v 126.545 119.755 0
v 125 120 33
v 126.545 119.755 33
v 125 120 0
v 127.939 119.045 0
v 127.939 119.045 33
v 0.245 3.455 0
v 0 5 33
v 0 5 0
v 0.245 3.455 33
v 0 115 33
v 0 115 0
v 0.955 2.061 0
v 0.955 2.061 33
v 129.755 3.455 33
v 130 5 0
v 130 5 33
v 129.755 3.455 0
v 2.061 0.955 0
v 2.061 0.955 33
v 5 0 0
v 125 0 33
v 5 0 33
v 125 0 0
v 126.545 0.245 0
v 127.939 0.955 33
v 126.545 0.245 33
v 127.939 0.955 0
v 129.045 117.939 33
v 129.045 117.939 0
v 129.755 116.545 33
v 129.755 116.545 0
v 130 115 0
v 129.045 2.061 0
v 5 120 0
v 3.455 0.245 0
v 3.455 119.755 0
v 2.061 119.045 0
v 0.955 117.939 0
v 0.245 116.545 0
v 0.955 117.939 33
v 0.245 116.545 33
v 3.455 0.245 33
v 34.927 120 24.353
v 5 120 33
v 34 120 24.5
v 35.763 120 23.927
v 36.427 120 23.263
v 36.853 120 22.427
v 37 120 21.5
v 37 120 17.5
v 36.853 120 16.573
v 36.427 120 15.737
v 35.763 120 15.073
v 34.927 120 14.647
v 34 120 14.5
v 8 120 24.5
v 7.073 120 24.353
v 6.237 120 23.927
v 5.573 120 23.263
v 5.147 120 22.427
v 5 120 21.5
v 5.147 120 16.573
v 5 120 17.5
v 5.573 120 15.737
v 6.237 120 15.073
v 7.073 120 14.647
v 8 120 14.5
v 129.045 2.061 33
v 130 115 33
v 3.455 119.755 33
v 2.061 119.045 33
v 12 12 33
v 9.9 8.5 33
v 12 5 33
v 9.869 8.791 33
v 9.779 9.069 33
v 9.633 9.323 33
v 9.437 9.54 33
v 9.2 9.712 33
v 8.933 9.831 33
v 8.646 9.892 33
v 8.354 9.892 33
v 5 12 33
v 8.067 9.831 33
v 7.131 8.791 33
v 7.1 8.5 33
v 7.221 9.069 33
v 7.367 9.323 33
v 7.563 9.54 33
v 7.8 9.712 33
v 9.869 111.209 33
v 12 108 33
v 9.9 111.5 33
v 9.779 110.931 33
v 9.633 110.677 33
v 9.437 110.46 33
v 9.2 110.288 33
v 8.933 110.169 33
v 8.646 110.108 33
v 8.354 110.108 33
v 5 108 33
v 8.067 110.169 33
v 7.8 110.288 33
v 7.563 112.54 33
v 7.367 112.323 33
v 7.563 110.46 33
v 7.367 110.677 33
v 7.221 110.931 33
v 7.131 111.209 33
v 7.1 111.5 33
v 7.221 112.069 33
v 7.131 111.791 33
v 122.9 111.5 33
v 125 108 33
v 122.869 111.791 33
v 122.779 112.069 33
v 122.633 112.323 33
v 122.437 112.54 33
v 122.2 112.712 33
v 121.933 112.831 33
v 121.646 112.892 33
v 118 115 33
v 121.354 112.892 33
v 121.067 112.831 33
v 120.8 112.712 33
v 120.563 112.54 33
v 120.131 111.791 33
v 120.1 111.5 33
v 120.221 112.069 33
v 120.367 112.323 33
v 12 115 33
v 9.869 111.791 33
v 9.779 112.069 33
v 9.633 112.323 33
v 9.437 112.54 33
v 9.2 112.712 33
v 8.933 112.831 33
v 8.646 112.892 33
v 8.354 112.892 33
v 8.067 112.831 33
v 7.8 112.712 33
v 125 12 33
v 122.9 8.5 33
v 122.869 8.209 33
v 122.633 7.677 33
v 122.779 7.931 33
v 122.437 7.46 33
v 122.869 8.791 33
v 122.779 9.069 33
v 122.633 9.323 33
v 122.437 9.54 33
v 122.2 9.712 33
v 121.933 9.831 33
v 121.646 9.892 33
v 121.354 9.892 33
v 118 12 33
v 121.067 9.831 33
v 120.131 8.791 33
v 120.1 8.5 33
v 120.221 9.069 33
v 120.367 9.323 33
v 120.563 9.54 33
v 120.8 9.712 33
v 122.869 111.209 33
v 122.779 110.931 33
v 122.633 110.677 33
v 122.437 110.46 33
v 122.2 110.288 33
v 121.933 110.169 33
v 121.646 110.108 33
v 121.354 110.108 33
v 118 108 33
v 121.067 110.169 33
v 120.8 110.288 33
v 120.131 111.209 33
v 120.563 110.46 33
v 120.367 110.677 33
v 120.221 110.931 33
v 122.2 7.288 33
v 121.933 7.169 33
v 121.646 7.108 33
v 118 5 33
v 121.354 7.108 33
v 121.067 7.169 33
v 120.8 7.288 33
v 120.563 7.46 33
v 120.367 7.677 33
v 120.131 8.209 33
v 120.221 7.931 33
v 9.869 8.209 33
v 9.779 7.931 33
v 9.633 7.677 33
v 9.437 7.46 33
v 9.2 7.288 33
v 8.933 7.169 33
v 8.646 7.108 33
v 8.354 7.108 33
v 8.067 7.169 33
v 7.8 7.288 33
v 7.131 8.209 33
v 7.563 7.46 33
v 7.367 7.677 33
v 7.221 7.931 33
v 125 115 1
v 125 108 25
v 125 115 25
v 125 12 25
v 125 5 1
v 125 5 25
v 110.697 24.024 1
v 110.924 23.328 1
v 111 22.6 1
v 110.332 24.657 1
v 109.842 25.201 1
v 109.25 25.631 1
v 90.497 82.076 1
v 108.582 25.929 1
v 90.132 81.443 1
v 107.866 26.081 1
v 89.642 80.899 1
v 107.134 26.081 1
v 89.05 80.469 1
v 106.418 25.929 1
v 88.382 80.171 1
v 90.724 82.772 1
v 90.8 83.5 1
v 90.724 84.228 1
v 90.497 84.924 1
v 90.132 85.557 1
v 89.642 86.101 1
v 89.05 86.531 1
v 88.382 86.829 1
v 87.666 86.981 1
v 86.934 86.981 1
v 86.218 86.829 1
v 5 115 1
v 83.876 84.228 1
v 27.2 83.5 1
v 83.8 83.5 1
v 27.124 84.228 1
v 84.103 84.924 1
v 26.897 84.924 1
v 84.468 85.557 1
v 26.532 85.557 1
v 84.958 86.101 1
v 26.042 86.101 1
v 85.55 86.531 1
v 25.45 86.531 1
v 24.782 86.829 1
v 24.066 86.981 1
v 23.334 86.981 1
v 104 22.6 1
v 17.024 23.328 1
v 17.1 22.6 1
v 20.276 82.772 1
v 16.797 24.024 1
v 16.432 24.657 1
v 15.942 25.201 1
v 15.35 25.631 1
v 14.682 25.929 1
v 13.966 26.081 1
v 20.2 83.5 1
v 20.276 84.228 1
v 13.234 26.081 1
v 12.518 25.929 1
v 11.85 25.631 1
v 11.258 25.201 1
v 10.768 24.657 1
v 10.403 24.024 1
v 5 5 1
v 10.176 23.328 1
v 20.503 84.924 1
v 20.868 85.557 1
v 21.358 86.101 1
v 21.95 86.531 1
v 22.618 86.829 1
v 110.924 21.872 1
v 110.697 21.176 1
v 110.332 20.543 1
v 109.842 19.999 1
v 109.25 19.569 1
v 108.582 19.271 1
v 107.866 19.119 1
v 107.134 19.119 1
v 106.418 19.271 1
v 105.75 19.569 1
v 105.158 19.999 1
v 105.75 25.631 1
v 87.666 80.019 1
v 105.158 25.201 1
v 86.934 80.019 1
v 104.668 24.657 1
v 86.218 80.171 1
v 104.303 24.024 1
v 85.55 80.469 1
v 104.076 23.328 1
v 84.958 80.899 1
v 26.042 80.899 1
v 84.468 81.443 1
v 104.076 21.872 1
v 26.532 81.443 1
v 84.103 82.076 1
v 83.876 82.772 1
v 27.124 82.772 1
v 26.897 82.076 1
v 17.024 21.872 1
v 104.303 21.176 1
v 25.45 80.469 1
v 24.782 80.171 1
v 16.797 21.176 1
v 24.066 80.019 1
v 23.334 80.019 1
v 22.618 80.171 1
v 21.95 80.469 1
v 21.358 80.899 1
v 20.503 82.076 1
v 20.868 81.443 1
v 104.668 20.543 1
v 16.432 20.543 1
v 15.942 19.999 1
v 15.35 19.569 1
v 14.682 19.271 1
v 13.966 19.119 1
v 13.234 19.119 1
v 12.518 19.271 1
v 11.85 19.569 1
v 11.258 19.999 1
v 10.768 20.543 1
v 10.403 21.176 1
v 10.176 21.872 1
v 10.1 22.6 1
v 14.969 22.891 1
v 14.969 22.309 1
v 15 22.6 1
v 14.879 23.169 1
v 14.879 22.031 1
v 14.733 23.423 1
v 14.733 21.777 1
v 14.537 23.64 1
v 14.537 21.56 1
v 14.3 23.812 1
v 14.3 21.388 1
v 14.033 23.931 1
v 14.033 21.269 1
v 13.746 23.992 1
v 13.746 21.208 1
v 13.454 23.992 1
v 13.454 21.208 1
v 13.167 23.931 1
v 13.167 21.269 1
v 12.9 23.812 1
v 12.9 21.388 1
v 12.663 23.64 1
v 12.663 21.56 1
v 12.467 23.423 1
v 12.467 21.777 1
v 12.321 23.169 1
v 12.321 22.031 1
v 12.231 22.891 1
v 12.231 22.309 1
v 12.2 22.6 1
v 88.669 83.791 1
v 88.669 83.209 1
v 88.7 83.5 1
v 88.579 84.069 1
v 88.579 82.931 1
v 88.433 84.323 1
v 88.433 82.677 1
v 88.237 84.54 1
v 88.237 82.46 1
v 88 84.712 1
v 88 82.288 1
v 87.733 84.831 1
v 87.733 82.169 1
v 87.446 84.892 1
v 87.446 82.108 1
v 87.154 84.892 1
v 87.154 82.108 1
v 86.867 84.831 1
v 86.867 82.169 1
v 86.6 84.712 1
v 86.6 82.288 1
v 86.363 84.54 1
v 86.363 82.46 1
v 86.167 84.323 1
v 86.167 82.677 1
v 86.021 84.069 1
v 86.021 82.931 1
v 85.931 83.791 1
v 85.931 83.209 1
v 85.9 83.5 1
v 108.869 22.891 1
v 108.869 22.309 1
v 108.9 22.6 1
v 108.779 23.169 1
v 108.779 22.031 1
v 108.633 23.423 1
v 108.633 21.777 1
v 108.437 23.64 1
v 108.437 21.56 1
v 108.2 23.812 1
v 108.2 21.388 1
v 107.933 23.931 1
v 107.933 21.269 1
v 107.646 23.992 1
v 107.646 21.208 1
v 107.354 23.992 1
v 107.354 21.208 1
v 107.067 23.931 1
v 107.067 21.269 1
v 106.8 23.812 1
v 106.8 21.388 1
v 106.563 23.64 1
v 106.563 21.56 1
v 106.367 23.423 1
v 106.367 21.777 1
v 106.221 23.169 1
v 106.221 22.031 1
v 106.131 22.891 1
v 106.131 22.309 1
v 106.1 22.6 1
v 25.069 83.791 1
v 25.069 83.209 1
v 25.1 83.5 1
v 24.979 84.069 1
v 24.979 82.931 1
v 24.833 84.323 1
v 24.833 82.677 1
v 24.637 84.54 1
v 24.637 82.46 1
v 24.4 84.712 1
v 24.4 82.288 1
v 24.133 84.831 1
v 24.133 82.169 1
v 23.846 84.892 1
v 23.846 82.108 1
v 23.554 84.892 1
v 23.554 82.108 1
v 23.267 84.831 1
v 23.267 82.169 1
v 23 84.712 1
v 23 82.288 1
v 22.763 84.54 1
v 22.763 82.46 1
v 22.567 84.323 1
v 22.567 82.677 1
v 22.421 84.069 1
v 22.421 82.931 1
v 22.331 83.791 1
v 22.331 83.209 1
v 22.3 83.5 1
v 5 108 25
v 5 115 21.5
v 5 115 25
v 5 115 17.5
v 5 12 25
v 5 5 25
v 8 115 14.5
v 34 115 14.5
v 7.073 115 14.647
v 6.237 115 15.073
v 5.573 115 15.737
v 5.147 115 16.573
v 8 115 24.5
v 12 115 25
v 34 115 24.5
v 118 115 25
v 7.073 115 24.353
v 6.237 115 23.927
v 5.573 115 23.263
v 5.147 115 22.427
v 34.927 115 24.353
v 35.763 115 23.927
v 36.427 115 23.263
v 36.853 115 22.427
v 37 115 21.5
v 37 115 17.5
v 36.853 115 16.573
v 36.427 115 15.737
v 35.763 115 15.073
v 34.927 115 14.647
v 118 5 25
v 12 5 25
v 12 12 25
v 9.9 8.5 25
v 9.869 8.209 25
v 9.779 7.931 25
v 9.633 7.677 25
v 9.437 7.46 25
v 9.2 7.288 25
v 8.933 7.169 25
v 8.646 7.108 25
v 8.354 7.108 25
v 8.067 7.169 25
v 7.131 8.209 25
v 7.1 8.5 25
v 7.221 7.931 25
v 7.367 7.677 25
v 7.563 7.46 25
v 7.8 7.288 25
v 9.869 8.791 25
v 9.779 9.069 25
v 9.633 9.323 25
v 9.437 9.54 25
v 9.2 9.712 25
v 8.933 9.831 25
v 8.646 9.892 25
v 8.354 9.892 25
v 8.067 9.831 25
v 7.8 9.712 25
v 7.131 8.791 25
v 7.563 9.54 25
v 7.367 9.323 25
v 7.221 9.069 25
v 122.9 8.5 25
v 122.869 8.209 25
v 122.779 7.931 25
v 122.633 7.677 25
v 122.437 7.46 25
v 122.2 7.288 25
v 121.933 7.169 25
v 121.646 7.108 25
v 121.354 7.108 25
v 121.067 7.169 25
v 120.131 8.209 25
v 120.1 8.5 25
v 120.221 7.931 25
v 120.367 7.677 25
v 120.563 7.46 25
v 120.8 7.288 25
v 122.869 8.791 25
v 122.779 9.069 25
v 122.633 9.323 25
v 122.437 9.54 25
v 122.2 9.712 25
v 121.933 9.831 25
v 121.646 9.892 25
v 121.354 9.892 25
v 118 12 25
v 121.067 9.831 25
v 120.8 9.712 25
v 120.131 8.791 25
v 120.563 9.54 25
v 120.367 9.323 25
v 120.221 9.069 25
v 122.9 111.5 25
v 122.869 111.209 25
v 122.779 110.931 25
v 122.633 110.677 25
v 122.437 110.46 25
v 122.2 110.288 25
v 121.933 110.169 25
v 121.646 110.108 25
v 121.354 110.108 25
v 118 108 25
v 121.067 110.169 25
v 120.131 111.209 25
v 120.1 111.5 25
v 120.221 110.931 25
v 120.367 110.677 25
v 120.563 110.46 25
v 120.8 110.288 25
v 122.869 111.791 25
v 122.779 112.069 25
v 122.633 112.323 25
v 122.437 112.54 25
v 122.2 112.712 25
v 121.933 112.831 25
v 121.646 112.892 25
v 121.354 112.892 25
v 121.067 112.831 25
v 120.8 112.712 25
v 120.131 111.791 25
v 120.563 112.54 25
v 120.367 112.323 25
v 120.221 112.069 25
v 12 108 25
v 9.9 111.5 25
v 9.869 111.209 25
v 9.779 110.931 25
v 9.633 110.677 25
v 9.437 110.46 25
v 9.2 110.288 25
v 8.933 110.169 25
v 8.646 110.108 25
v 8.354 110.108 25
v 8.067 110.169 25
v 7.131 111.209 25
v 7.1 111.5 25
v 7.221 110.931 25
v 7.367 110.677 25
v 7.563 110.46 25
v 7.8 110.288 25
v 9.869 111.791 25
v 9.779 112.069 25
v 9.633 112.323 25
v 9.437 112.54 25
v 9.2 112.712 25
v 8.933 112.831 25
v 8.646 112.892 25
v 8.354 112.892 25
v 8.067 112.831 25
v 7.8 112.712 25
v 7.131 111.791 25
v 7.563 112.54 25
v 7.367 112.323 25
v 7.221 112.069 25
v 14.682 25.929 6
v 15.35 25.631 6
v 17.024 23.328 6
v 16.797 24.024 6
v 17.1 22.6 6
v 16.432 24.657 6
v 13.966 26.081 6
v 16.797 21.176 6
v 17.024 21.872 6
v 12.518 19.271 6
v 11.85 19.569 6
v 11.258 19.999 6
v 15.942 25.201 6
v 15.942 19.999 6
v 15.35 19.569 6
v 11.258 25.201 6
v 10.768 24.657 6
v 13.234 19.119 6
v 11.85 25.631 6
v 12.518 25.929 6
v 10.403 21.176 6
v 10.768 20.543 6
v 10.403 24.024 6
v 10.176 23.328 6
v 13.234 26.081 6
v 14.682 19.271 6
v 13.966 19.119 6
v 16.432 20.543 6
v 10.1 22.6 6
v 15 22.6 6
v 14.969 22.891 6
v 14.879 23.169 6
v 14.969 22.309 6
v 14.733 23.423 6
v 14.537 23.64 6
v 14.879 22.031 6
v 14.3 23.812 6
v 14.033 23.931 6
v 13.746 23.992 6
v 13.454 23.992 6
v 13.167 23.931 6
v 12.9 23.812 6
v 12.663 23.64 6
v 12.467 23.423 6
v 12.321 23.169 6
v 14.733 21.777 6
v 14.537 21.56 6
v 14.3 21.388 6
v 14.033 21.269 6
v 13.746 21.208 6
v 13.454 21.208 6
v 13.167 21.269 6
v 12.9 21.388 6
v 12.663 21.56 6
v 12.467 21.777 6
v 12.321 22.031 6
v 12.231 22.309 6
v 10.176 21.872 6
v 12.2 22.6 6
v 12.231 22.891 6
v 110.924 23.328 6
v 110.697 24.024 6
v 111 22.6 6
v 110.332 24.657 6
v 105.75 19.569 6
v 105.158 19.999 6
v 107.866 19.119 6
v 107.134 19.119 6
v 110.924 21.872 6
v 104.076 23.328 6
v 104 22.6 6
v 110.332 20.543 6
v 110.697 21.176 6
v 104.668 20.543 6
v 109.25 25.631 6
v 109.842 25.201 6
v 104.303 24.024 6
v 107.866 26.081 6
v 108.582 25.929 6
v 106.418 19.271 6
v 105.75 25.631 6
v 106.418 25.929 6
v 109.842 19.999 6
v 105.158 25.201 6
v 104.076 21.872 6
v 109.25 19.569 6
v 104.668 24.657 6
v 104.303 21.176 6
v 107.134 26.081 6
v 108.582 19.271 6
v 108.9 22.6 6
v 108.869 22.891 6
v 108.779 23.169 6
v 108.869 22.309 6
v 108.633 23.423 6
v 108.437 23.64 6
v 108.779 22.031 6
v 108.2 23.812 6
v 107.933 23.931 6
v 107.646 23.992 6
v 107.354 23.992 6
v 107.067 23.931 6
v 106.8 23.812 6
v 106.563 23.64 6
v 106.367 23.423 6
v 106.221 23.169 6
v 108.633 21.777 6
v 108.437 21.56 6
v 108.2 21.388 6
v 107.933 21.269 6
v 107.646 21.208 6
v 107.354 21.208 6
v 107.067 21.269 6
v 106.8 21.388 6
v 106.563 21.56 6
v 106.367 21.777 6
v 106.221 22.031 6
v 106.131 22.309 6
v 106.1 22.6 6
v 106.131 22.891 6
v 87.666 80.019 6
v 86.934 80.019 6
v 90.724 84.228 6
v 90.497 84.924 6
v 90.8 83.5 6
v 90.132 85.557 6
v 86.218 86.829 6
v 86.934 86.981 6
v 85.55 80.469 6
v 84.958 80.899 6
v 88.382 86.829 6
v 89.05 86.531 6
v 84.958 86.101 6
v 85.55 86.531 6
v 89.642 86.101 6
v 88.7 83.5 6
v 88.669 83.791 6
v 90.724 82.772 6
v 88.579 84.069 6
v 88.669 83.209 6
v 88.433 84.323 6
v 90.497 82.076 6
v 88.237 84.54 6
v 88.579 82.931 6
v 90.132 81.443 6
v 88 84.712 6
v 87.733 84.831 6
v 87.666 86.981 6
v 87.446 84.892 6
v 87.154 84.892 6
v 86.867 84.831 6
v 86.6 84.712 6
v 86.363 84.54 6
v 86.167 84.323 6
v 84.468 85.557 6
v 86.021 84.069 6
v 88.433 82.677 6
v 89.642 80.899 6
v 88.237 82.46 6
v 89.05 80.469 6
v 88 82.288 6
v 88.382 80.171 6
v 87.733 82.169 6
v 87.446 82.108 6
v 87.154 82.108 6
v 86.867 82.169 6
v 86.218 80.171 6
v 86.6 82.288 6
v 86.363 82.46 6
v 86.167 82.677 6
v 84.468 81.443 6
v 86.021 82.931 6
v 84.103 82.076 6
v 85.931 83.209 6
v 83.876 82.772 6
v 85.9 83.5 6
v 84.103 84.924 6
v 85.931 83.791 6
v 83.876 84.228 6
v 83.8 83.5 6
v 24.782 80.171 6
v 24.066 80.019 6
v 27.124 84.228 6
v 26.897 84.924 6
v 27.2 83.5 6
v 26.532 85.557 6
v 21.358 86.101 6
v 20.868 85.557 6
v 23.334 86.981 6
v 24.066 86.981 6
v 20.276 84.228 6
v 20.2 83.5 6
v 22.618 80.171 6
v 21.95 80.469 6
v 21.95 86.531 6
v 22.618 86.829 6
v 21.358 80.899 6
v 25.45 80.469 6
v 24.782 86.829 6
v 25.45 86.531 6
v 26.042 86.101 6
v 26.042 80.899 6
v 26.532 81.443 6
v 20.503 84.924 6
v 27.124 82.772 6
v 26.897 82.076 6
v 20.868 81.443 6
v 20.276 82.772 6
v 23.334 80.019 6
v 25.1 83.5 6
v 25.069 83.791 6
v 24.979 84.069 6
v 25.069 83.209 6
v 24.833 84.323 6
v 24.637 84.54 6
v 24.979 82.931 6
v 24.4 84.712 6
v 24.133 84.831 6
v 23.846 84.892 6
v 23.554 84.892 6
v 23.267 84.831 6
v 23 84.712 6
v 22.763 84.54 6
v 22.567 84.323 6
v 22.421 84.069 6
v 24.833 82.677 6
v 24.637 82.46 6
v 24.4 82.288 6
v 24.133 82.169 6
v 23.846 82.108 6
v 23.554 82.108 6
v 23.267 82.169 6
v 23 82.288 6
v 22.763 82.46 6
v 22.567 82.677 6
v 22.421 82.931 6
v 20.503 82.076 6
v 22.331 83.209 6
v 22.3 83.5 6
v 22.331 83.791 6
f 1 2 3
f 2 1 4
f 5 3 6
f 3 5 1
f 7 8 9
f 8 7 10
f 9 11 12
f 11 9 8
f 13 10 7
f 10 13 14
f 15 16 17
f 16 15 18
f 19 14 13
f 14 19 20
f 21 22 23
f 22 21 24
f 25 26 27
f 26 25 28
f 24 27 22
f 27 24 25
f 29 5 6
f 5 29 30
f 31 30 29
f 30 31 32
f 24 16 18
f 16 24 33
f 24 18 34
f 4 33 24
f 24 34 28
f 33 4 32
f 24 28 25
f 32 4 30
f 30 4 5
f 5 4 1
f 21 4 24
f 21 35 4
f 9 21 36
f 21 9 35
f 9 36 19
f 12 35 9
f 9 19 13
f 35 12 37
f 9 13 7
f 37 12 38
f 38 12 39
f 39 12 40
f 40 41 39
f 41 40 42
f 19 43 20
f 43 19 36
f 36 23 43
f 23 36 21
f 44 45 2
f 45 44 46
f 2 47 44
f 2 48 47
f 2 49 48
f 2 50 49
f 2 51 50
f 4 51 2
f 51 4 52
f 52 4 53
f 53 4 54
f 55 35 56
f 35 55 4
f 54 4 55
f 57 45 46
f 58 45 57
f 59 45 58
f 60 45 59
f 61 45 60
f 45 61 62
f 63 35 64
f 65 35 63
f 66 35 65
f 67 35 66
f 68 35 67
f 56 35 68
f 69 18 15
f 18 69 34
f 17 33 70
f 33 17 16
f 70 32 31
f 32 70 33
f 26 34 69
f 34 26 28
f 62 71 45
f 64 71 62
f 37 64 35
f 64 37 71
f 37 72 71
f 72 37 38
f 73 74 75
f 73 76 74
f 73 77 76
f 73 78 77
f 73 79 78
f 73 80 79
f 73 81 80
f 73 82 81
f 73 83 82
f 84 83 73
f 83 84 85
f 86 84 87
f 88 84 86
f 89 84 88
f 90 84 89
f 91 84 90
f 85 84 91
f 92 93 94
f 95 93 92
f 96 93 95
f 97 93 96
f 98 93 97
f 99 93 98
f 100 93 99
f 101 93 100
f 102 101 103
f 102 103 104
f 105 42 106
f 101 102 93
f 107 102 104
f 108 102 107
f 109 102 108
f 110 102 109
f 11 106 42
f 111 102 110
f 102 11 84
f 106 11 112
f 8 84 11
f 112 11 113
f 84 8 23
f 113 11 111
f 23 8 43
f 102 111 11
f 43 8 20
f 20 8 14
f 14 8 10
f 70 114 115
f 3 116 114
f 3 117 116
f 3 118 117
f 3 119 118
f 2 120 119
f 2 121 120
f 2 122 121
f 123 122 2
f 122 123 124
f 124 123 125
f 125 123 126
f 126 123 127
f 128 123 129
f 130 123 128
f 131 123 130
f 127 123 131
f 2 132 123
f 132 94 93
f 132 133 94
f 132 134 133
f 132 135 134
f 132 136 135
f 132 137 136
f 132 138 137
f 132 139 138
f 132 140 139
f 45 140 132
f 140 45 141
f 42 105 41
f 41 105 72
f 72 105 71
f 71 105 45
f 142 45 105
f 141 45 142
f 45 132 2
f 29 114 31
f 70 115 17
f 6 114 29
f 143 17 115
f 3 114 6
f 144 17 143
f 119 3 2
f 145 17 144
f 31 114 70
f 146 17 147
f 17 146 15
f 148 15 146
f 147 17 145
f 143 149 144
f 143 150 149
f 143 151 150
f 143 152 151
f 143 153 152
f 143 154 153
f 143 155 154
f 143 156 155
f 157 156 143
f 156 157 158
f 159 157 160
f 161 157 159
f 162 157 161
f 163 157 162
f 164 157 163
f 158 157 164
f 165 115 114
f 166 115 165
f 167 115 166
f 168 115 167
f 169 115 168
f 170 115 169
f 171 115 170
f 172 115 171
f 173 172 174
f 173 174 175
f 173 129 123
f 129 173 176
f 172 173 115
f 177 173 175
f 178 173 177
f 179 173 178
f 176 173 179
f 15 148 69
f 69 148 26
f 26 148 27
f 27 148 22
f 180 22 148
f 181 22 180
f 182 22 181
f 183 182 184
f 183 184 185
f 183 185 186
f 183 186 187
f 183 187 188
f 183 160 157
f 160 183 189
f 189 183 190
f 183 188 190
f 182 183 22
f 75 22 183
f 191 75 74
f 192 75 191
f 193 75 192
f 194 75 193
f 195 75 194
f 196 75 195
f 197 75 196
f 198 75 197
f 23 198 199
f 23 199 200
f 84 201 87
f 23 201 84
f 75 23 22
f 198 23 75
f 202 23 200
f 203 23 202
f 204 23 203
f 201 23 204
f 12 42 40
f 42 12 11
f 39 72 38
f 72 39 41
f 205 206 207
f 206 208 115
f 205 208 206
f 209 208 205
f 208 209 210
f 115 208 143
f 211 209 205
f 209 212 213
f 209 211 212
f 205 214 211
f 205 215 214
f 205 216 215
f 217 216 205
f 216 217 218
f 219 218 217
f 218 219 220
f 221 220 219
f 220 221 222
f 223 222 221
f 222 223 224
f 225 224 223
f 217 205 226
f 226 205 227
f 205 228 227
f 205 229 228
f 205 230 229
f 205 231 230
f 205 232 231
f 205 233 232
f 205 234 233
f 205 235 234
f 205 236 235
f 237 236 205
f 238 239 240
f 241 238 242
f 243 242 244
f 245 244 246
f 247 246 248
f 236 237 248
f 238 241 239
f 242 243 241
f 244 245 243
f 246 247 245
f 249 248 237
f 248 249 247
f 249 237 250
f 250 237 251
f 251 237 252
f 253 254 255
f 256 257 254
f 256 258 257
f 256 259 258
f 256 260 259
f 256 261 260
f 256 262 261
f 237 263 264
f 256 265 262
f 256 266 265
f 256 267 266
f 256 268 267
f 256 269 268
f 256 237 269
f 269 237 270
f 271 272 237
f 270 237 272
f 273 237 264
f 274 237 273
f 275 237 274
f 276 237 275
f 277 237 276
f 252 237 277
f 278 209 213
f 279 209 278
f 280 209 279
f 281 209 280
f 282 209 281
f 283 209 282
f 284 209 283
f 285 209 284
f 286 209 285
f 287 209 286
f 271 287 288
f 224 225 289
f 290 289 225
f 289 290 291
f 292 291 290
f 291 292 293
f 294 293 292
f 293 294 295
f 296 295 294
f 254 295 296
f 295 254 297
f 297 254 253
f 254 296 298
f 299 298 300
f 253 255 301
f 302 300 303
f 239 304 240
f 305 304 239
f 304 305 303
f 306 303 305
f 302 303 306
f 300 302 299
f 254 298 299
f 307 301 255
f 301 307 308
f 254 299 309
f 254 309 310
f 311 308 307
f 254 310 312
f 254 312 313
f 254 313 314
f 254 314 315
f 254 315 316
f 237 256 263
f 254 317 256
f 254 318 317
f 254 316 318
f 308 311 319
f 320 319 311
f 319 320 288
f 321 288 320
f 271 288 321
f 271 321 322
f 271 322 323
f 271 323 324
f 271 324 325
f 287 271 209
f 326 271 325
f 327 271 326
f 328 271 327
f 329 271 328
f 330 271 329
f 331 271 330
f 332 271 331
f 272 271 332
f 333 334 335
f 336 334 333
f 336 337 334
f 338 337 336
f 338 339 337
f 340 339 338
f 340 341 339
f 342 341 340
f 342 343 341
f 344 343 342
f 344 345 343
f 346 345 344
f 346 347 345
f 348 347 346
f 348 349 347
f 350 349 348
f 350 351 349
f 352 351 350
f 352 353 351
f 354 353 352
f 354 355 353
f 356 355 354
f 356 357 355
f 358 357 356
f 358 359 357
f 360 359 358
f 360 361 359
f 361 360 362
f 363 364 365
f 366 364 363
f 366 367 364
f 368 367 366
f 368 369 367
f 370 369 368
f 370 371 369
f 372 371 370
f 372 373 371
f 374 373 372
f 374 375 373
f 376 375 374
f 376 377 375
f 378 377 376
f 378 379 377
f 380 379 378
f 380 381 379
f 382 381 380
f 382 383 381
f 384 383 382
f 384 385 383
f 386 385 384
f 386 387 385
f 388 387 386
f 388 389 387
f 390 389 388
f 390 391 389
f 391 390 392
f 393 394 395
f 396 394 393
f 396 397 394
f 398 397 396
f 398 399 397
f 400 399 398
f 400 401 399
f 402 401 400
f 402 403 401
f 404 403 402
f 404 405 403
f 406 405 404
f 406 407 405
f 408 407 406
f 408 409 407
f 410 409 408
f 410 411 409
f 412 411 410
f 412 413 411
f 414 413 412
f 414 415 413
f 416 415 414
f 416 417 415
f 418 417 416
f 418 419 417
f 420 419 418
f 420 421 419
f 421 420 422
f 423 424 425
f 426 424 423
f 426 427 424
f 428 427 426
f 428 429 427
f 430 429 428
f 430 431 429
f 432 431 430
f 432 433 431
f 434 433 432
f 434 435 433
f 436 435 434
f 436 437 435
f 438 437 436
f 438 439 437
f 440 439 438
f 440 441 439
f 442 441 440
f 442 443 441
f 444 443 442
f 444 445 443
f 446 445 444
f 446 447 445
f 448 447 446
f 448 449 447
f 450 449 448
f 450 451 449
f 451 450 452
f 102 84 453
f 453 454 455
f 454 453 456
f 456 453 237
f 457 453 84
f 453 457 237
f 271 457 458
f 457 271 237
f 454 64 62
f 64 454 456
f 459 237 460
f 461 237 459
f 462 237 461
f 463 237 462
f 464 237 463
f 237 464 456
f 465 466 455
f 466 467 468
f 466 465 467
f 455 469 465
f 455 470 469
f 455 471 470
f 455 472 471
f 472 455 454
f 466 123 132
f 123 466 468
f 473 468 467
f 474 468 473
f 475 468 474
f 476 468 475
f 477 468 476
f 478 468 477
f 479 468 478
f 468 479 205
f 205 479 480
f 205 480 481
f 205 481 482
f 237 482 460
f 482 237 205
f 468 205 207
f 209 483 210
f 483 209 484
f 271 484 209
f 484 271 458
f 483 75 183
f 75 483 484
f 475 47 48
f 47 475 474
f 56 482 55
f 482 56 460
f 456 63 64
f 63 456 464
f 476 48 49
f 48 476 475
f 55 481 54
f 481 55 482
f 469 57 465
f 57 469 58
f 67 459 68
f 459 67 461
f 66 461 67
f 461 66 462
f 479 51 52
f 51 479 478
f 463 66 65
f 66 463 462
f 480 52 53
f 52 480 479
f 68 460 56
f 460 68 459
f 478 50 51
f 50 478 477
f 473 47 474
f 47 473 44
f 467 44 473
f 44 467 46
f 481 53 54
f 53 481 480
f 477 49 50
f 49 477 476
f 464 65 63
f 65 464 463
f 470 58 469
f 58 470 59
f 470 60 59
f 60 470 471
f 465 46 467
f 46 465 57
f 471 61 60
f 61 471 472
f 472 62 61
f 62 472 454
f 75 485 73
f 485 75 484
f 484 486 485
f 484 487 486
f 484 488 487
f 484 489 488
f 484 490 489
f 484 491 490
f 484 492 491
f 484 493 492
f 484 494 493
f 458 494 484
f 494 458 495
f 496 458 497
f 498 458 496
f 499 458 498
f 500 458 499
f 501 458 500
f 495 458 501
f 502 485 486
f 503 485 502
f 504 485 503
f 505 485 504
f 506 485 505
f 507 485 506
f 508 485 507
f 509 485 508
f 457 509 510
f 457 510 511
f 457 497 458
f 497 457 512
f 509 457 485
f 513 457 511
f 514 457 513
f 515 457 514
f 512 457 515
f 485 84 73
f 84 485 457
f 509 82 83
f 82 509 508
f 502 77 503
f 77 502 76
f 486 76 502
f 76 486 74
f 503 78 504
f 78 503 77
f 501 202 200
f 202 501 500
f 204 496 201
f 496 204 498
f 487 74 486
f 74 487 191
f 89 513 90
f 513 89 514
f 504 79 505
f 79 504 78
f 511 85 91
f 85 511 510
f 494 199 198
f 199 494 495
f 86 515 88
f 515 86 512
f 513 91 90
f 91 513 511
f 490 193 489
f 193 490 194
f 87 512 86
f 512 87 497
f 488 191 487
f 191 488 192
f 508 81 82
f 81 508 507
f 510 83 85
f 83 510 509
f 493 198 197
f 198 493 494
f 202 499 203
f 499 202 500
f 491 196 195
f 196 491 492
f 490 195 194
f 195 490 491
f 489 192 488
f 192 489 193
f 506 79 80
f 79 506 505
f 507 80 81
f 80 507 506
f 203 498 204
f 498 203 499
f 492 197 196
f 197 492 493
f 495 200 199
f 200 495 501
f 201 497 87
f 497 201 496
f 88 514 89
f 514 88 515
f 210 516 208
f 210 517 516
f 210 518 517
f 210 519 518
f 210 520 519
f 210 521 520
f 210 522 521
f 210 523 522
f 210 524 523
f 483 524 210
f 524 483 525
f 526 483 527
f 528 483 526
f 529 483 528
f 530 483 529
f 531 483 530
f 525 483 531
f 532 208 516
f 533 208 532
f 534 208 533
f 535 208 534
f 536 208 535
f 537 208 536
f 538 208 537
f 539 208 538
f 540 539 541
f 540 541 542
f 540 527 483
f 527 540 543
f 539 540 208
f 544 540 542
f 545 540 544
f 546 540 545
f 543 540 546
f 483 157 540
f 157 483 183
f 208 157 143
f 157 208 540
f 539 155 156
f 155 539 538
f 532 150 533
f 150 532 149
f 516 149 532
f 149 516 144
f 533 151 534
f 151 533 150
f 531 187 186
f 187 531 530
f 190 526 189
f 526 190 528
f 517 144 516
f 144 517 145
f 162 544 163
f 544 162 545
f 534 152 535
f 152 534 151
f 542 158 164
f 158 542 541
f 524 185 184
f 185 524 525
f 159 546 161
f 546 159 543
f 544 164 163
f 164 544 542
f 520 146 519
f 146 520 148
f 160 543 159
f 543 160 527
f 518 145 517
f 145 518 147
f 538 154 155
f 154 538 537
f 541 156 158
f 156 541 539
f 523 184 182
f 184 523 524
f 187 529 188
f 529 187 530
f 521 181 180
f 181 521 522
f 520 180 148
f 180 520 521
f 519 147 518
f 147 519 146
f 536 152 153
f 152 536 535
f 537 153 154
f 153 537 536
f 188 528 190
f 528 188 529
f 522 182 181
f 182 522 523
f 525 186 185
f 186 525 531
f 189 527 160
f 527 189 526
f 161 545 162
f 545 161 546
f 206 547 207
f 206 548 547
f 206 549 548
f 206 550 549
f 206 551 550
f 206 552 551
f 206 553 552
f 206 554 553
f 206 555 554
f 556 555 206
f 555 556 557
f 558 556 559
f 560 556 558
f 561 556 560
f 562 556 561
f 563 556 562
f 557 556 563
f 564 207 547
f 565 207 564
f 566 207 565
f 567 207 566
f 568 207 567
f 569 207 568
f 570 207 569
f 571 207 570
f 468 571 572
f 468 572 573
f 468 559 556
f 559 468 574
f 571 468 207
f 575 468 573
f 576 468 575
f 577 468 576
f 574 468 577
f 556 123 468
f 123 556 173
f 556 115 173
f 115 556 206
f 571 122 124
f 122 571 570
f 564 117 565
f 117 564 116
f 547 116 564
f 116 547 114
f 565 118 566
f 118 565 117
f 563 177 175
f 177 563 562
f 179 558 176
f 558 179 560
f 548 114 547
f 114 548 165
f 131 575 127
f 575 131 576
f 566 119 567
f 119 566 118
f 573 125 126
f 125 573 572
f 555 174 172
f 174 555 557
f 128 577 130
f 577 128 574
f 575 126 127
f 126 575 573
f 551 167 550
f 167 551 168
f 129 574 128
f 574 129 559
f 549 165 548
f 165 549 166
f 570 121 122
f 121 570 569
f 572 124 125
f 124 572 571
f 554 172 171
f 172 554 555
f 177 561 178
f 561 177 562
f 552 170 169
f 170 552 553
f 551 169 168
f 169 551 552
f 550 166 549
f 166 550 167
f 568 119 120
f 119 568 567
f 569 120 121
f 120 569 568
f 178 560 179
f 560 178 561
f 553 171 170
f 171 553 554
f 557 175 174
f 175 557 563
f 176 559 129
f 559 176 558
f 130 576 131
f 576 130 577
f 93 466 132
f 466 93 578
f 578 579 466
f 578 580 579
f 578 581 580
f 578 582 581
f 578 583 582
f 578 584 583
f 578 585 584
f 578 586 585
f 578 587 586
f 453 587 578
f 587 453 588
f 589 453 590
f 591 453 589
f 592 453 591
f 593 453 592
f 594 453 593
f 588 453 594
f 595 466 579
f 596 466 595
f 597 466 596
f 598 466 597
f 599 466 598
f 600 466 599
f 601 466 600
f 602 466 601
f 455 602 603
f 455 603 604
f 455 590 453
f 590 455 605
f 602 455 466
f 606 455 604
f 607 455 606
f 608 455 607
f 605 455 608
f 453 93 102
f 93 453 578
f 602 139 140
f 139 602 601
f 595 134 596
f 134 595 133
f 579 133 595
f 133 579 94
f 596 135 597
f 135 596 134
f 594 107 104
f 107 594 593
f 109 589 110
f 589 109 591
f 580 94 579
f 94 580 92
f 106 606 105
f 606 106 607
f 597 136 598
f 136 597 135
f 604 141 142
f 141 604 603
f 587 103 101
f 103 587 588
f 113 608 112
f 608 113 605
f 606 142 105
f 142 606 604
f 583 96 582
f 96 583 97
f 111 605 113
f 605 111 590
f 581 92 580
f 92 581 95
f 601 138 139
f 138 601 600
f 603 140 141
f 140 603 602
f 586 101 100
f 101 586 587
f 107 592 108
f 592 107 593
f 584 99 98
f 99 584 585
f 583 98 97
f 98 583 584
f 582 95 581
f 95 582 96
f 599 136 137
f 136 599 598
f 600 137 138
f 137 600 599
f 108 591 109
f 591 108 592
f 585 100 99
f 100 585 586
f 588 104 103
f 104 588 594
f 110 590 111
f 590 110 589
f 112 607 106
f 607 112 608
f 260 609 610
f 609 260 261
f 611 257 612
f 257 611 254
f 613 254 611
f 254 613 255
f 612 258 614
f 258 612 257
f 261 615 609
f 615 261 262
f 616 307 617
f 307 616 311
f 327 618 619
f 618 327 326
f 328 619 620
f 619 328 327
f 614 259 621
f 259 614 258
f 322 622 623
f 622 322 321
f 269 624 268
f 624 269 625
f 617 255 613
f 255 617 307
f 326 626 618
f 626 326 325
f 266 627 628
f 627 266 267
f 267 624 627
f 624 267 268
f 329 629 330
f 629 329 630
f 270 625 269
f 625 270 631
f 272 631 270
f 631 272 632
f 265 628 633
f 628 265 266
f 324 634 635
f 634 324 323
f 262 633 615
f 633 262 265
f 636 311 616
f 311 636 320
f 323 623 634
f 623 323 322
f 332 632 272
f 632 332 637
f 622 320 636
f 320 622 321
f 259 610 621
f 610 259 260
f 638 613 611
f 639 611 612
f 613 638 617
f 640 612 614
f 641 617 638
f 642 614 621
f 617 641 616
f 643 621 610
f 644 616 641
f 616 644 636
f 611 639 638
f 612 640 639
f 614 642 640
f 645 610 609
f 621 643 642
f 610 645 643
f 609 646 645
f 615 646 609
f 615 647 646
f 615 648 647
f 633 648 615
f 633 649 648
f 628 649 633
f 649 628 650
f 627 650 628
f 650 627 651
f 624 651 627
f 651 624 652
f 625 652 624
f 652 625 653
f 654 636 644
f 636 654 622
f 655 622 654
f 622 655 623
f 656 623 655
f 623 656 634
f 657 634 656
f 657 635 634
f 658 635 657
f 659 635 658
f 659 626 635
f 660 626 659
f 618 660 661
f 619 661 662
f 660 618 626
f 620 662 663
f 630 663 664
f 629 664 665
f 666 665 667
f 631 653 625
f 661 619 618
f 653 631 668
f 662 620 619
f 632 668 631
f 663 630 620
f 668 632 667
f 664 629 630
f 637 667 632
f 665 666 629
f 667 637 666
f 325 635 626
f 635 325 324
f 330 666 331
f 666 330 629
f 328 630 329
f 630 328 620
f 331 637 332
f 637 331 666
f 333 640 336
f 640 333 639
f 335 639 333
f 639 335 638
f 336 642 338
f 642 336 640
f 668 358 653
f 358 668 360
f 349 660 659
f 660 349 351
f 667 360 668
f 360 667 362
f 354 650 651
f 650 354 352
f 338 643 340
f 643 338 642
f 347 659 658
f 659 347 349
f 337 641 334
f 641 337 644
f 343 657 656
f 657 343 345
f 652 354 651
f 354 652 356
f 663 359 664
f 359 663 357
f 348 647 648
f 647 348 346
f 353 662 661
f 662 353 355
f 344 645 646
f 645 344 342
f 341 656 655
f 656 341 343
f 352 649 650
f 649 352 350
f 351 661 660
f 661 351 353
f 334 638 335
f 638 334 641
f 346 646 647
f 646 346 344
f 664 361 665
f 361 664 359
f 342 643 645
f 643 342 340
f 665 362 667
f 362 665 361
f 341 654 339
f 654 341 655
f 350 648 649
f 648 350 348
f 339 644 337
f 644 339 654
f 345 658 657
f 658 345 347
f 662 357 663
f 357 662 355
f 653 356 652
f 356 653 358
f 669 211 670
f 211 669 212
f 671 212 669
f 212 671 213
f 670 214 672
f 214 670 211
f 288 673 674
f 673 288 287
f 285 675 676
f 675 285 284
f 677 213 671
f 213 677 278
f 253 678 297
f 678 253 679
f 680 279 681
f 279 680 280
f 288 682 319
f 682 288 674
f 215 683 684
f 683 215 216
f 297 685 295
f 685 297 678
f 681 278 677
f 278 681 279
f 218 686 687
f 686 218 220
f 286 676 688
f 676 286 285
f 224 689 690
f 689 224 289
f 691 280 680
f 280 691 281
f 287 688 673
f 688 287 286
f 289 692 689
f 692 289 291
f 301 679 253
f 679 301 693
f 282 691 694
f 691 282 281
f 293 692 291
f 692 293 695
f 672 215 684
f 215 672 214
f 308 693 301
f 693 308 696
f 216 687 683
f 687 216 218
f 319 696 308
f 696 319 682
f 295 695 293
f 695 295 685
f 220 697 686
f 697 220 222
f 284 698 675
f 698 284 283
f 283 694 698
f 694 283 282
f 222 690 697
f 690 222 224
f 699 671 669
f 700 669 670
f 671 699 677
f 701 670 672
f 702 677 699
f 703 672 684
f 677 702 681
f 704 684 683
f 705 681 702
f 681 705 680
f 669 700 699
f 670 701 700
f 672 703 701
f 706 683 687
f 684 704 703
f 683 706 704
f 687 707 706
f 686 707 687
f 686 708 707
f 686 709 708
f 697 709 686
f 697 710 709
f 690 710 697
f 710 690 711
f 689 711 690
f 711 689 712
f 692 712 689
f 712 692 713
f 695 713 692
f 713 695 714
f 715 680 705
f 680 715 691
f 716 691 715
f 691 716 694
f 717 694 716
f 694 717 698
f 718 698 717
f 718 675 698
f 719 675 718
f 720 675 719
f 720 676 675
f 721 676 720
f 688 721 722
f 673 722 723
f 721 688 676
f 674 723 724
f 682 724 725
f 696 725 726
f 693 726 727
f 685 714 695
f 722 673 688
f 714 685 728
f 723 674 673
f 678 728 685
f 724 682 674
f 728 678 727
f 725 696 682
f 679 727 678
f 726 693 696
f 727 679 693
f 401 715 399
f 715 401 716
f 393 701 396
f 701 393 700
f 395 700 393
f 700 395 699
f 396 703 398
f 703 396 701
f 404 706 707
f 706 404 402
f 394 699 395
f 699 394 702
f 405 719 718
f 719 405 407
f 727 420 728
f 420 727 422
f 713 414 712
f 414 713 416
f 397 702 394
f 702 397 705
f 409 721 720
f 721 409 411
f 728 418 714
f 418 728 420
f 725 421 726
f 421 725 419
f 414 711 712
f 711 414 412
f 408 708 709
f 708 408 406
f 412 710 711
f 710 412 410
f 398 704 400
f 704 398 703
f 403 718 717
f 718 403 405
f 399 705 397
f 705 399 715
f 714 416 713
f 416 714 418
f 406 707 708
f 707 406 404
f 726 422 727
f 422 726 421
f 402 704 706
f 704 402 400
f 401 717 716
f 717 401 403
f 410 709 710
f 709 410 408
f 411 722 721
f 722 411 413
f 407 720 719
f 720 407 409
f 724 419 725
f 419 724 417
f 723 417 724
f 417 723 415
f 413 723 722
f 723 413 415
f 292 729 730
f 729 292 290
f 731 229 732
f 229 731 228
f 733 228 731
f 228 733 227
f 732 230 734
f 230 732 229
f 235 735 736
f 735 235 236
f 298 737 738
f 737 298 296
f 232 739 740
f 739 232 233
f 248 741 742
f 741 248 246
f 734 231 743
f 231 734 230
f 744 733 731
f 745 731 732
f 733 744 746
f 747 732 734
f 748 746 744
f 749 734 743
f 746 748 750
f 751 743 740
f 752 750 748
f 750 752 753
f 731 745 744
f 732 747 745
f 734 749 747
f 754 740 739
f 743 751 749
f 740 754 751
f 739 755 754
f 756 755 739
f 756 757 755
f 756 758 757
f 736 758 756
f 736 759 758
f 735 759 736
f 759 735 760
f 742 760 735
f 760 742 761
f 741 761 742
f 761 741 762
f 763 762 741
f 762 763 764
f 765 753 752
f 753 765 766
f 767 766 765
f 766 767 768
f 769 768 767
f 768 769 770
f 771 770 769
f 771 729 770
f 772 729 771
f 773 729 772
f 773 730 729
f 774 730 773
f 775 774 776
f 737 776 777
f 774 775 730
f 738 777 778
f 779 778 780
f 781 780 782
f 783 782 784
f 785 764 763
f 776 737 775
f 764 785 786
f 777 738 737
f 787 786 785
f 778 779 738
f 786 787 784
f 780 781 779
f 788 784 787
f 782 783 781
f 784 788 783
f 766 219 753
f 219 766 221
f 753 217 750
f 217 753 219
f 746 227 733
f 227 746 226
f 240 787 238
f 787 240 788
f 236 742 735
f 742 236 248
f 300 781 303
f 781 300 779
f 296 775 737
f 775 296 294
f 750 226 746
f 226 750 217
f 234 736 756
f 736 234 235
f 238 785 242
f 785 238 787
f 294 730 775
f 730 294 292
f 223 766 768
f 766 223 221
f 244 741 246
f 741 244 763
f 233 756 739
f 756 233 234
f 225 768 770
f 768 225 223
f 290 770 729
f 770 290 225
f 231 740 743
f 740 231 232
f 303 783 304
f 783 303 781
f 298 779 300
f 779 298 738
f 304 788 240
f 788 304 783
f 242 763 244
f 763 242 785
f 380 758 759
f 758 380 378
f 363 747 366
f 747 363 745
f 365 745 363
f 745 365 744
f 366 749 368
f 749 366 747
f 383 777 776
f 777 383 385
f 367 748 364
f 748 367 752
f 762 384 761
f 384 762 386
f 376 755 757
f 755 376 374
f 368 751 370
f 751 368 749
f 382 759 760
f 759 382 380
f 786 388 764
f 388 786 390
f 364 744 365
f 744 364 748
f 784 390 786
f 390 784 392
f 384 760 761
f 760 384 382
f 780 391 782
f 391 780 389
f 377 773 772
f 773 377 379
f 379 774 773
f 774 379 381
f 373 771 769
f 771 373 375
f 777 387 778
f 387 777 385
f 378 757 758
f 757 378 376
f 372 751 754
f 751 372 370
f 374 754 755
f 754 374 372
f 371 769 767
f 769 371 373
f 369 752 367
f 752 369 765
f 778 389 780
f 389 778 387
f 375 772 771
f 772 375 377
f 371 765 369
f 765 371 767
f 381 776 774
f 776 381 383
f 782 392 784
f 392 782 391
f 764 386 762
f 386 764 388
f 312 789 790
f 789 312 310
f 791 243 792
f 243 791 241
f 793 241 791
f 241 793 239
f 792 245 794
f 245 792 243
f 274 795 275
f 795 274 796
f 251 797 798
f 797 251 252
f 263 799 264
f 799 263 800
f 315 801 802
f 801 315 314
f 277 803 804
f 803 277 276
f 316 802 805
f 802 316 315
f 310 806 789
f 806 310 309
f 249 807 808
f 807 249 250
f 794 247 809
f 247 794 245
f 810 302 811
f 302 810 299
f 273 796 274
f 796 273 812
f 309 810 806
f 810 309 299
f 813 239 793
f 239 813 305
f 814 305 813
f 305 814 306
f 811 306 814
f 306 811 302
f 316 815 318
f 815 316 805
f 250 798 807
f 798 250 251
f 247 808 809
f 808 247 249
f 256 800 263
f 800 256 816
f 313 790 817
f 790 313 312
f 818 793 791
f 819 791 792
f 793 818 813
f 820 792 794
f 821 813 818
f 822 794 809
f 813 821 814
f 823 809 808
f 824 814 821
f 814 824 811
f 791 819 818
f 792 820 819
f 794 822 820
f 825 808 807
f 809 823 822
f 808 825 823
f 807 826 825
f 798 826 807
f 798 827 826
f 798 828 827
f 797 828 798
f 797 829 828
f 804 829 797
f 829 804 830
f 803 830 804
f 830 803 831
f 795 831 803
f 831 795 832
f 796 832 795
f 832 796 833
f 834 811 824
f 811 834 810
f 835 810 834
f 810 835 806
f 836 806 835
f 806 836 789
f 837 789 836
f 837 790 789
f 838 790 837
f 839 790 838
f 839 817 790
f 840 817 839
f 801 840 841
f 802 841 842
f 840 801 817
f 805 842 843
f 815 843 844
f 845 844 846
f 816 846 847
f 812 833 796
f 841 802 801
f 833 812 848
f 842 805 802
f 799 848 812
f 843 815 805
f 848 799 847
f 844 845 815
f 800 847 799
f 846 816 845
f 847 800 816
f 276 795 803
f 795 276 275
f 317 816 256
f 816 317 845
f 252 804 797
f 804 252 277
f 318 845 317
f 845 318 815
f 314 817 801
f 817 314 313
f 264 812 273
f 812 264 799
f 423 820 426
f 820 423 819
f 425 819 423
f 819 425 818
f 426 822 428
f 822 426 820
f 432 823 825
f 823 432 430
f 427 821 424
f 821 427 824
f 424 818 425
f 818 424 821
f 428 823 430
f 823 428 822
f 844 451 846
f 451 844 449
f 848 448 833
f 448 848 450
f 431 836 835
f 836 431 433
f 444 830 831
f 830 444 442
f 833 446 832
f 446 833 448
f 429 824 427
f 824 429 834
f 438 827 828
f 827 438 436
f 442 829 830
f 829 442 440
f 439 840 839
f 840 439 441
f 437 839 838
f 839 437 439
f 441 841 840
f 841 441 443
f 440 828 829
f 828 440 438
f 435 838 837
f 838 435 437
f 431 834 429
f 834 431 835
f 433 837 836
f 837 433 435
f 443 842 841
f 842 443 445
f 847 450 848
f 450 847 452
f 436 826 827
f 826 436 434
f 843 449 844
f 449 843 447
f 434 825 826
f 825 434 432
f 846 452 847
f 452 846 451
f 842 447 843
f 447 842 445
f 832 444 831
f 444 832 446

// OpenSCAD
//include <lib/roundedcube.scad>

// Helperinos
module rounded_square(d,r) {
    minkowski() {
        translate([r,r]) square([d[0]-2*r, d[1]-2*r]);
        circle(r, $fn=20);
    }
}
module rounded_cube(d, r) {
    linear_extrude(d[2]) { rounded_square([d[0],d[1]], r); }
}

// ---- BASE ------
base_x = 130;
base_y = 120;
// - Wall thickness*2
base_margin = 10;
base_thick = 1;
base_height = 33;
// ----- ESP CUTOUT ------
// Height offset over board
esp_offset = 8;
esp_width = 32;
esp_height = 10;
// ------ PCB SCREW POSTS ----
post_height = 5;
post_screw_dia = 2.8;
post_dia = 7;
posts = [ [7.6,7.6], [101.5, 7.6], [81.3, 68.5], [17.7, 68.5] ];
// ------ PCB -------
pcb_pos_x = 1;
pcb_pos_y = 10;
// ------ TOP SCREW POSTS -----
top_post_height = 8;
top_post_screw_dia = 2.8;
top_post_sq = 7;

// Create the baseplate and perimeter
difference() {
    // Base cube
    rounded_cube([base_x, base_y, base_height], 5);
    // Cut the inner part out
    translate([base_x/2, base_y/2, base_height/2 + base_thick])
    cube([base_x-base_margin, base_y-base_margin, base_height], true);
    // Create a cutout for the ESP
    // - 1.5 is approx. board thickness
    color("green") translate([base_margin/2, base_y + .5, post_height + 1.5 + esp_offset]) rotate([90,0,0]) rounded_cube([esp_width, esp_height, base_margin/2 + 1], 3);
}

// Create the top screw posts
top_posts = [
    [base_margin/2,base_margin/2],
    [base_x - base_margin/2 - top_post_sq, base_margin/2],
    [base_x - base_margin/2 - top_post_sq, base_y - base_margin/2 - top_post_sq],
    [base_margin/2, base_y - base_margin/2 - top_post_sq]
];
for(post = top_posts) {
    difference() {
        // Post
        color("orange") translate([post[0], post[1], base_height - top_post_height])
        cube([top_post_sq,top_post_sq,top_post_height]);
        // Screw hole
        translate([post[0] + top_post_sq/2, post[1] + top_post_sq/2, base_height - top_post_height - 0.5]) cylinder(h=top_post_height + 1, d=top_post_screw_dia, $fn=30);
    }

}

// Create the 4 screw posts
for(post = posts) {
    difference() {
        // Base post
        color("red") 
        translate([base_margin/2 + post[0] + pcb_pos_x, base_margin/2 + post[1] + pcb_pos_y, base_thick])
        cylinder(post_height, d=post_dia, $fn=30);
        // Cut the screwhole out
        translate([base_margin/2 + post[0] + pcb_pos_x, base_margin/2 + post[1] + pcb_pos_y, base_thick])
        cylinder(post_height+1, d=post_screw_dia, $fn=30);
    }

}

// Import the board as a template
// - offset messed up origin
//translate([-58.42, 157.5, 0])
//translate([base_margin/2 + pcb_pos_x, base_margin/2 + pcb_pos_y, post_height])
// - place in base
// - exported from KiCad
//import("uam-thing-board.stl");
